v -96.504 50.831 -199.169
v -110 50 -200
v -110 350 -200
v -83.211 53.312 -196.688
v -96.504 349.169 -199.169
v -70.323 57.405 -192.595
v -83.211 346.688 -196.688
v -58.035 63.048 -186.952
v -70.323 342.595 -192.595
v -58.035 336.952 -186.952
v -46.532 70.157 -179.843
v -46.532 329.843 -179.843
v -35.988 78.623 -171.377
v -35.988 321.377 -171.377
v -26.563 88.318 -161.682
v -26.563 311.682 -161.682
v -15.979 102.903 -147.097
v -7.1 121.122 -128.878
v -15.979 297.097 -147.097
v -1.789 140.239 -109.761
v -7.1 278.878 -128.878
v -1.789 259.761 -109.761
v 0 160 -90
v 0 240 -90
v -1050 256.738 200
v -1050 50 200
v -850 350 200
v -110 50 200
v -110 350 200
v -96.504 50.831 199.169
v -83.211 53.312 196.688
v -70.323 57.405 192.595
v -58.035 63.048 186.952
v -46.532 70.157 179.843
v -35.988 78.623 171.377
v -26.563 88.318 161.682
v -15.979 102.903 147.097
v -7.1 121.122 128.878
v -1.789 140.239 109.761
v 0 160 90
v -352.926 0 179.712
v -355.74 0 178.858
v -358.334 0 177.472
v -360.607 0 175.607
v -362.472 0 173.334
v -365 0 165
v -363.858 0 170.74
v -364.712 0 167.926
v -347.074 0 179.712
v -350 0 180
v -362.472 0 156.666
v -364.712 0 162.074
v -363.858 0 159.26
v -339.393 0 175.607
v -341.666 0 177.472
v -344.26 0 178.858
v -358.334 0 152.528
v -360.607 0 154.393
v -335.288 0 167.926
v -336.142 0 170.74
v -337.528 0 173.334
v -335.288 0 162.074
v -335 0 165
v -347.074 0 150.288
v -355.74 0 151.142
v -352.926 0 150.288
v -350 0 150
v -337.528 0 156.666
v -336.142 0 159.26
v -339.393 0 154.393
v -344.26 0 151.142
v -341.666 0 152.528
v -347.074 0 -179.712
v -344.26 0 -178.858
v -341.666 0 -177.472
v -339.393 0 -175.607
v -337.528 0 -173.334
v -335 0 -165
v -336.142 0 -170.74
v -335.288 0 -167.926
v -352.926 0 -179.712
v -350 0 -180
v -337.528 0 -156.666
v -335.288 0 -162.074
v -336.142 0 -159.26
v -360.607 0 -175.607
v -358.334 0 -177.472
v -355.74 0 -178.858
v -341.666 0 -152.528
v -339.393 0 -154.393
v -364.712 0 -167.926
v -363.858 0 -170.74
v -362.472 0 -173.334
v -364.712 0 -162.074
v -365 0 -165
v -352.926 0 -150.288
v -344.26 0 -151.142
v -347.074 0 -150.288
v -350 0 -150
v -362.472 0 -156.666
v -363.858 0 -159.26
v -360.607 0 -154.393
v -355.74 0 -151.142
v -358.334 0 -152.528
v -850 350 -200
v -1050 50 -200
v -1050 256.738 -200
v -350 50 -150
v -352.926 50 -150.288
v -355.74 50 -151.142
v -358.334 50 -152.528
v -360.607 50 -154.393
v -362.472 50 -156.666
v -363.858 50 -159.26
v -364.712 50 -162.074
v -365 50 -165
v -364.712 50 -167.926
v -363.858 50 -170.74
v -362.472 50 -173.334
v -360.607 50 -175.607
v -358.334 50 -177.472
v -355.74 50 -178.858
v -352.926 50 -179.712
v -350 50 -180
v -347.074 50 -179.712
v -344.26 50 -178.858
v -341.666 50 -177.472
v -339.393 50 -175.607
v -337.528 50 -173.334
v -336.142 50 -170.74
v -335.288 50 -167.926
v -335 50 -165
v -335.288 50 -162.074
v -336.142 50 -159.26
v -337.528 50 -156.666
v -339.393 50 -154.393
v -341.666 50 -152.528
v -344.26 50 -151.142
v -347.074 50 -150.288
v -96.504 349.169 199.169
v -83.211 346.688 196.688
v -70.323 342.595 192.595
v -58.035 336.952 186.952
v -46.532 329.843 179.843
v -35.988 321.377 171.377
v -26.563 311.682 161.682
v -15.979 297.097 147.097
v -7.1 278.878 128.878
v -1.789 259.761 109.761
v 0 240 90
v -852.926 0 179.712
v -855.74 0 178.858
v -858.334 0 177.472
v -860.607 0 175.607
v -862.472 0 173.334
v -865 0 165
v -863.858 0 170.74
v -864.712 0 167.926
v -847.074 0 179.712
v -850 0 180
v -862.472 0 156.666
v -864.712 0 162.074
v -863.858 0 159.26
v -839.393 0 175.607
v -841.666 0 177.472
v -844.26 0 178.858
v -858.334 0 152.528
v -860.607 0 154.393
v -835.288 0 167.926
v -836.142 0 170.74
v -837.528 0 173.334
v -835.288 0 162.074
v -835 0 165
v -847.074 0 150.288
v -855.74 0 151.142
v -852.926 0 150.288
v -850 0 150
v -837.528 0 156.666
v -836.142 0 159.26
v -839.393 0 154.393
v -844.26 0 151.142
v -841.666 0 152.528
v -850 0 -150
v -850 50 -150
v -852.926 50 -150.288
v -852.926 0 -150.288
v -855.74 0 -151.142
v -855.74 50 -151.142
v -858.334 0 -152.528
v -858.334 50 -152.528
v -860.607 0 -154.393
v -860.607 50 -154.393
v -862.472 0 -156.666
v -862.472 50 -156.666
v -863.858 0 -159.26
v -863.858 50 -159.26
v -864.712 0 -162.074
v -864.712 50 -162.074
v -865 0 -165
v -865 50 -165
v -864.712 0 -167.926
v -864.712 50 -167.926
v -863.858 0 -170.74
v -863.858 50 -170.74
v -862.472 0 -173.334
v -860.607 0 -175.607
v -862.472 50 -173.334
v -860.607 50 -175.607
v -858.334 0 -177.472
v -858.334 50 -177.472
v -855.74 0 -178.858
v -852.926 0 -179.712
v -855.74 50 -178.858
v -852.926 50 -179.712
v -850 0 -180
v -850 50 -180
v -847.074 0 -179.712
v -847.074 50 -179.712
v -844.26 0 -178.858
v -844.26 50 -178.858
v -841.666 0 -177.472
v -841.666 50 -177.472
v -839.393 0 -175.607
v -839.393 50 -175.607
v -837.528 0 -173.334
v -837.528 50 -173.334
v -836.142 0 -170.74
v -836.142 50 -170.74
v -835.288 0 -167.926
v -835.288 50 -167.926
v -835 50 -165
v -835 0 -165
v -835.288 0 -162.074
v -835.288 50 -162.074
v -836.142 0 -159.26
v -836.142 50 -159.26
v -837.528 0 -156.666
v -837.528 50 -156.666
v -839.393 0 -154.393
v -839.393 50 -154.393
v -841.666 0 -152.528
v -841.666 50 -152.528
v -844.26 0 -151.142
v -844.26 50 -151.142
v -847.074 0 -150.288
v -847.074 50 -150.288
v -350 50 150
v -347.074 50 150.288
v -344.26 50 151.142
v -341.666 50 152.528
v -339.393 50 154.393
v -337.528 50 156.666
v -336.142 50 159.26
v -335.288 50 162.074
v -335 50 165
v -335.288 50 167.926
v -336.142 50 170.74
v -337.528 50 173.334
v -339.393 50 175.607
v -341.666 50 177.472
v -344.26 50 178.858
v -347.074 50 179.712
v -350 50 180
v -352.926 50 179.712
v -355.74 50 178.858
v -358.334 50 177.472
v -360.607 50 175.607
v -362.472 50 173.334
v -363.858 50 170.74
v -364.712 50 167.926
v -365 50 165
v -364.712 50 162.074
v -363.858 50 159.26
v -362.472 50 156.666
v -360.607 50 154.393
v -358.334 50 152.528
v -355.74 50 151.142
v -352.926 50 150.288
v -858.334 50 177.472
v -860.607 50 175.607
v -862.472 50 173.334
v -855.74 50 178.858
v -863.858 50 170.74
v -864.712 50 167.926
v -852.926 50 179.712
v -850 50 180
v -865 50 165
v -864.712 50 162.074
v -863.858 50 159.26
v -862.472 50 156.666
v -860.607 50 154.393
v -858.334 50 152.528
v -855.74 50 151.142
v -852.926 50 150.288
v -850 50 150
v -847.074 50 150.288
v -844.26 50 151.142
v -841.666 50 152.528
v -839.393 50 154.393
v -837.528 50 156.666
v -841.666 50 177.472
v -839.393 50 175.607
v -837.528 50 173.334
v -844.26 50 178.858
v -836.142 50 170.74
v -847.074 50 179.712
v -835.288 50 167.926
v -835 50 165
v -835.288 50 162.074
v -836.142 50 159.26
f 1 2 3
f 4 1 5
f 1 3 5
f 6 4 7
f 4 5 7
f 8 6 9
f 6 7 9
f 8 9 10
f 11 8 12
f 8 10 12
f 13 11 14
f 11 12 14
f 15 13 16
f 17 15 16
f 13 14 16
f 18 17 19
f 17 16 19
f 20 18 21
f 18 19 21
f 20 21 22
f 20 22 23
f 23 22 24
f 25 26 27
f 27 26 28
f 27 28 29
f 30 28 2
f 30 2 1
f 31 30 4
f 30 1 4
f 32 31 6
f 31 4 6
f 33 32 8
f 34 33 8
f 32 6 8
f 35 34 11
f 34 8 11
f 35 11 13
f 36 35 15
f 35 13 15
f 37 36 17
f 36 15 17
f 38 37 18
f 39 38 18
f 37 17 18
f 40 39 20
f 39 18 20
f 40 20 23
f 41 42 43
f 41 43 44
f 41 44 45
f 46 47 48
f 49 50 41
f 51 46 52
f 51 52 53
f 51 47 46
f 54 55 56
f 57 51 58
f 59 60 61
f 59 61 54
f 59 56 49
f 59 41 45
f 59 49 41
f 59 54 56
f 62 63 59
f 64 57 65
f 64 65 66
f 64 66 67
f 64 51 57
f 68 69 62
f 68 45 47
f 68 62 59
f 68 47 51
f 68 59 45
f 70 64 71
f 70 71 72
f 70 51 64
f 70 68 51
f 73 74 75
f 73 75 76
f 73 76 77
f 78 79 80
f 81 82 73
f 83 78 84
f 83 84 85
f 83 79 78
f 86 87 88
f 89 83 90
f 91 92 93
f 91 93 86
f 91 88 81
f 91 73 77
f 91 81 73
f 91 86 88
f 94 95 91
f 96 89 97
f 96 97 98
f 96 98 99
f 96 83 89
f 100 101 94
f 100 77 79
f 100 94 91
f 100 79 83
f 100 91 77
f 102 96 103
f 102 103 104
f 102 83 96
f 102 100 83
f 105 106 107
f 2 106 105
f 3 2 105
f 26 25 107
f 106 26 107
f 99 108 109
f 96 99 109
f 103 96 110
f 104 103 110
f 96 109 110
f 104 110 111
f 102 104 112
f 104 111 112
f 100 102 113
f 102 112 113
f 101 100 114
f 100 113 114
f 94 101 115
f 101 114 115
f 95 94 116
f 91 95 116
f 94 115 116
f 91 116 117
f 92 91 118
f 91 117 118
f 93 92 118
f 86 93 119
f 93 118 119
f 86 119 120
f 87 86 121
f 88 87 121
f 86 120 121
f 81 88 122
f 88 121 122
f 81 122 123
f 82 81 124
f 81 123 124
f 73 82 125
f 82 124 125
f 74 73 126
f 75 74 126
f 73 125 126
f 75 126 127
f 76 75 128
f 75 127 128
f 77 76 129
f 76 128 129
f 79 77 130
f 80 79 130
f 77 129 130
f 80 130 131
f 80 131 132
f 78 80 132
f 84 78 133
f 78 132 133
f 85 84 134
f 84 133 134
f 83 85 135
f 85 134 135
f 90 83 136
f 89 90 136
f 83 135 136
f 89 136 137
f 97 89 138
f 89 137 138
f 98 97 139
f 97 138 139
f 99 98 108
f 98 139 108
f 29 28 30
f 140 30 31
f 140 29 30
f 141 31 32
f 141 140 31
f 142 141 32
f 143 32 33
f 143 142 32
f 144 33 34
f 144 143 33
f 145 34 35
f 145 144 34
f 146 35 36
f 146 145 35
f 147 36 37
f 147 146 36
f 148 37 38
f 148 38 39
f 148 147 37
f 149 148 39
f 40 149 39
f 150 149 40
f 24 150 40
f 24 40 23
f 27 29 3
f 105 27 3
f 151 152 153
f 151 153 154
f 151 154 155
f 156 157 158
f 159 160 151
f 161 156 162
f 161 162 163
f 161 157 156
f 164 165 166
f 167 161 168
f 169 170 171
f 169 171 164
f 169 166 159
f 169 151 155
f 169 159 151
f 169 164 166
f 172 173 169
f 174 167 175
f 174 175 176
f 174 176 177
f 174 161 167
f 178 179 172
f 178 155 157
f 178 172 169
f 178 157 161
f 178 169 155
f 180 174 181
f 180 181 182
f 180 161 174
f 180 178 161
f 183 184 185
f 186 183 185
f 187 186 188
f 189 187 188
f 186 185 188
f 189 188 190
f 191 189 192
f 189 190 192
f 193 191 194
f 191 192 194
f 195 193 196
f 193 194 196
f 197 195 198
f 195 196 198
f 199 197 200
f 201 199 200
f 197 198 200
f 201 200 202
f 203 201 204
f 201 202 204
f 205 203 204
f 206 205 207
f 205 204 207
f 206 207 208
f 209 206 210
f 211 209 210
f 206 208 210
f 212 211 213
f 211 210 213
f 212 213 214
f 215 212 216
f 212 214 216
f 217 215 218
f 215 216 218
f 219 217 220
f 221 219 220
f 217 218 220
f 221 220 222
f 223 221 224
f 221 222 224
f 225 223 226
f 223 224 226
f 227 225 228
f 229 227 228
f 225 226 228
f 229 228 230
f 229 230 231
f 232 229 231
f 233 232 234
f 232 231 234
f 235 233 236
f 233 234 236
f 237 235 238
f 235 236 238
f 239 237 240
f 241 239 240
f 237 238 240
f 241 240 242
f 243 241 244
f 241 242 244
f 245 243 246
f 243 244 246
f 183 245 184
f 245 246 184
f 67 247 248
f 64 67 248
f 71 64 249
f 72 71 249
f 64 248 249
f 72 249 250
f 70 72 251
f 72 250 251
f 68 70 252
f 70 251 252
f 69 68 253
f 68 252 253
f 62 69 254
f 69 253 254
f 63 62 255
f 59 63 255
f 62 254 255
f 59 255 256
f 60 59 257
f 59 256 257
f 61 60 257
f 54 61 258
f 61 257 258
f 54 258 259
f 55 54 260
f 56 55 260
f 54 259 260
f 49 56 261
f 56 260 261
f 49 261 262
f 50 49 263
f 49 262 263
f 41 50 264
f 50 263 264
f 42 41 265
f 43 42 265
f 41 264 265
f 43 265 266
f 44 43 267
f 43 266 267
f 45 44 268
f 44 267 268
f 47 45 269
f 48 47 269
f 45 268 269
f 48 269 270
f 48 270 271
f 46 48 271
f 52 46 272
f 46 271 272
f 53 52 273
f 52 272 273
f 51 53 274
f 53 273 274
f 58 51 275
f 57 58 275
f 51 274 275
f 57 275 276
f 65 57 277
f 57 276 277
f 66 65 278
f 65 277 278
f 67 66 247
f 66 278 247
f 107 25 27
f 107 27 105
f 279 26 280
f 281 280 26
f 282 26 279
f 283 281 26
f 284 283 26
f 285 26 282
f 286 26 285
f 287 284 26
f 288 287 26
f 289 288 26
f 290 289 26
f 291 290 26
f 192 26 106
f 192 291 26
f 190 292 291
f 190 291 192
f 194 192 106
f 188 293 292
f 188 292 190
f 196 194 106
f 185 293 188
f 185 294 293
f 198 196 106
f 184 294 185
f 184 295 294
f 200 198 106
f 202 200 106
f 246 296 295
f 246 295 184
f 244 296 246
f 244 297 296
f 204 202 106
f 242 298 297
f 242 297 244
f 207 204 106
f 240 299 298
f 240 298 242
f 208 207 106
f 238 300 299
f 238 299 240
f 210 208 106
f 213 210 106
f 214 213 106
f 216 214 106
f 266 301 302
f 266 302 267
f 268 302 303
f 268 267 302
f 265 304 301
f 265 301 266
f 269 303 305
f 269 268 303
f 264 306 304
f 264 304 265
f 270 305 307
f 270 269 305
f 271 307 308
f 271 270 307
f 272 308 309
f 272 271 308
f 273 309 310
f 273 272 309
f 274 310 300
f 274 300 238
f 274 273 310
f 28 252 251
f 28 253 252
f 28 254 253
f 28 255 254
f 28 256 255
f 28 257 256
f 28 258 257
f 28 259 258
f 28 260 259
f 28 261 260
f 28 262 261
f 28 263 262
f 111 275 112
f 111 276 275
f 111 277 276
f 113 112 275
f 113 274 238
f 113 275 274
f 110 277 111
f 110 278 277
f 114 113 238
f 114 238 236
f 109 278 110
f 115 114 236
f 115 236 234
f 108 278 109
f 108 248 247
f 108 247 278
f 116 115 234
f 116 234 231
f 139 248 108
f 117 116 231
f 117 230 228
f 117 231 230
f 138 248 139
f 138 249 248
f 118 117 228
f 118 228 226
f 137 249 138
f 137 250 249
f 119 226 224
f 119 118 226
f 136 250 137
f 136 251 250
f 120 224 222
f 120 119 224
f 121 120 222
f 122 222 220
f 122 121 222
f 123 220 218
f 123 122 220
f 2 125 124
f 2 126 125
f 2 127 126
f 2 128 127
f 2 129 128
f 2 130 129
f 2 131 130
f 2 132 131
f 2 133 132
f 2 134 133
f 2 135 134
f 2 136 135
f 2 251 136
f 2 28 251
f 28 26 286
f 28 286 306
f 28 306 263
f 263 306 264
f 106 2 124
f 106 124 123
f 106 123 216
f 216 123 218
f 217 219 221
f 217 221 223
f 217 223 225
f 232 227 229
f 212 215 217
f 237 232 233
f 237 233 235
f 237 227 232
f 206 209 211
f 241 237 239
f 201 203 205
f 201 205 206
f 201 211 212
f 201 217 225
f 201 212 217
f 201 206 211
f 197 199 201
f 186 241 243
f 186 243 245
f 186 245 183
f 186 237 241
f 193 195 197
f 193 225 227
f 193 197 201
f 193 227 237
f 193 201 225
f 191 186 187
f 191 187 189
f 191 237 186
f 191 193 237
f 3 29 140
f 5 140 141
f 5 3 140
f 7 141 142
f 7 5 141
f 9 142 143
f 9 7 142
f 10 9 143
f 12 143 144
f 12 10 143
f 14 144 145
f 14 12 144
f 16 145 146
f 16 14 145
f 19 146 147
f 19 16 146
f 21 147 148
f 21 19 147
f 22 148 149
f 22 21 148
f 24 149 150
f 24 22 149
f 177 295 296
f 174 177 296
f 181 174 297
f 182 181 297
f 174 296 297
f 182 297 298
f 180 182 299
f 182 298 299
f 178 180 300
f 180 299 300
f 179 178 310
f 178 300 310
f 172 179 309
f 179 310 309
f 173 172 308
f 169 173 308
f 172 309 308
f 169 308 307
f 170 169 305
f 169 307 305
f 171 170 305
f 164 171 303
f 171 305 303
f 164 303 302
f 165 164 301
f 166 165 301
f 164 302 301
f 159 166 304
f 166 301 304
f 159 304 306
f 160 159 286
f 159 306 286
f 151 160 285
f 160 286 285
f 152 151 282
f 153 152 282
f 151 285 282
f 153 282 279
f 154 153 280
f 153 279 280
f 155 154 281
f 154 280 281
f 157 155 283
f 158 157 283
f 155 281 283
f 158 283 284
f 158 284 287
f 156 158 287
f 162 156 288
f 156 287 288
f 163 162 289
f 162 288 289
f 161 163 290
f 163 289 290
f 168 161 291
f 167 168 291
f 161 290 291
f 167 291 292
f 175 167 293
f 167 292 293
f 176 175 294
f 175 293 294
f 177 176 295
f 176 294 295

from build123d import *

# Parameters (mm, degrees)
SKETCH3_W           = 400
SKETCH3_H           = 300
BOSS_EXTRUDE2_DEPTH = 1050
FILLET1_R           = 110
CHAMFER1_SIZE       = 200
CHAMFER1_SIZE2      = 93.261531631
SKETCH4_R           = 15
BOSS_EXTRUDE3_DEPTH = 50


with BuildPart() as part:
    # Sketch3 → Boss-Extrude2 (new body)
    with BuildSketch(Plane(origin=(0, 0, 0), x_dir=(0, 0, -1), z_dir=(1, 0, 0))):
        with Locations((0, 200)):
            Rectangle(SKETCH3_W, SKETCH3_H)
    extrude(amount=-BOSS_EXTRUDE2_DEPTH)

    # Fillet1
    fillet1_edges = [part.edges().sort_by_distance(p)[0] for p in [
        (0, 350, 0),
        (0, 200, -200),
        (0, 50, 0),
        (0, 200, 200),
    ]]
    fillet(fillet1_edges, radius=FILLET1_R)

    # Chamfer1
    chamfer1_edges = [part.edges().sort_by_distance(p)[0] for p in [
        (-1050, 350, 0),
    ]]
    chamfer1_side = [part.faces().sort_by_distance(p)[0] for p in [
        (-580, 350, 0),
    ]]
    chamfer(chamfer1_edges, length=CHAMFER1_SIZE, length2=CHAMFER1_SIZE2, reference=chamfer1_side[0])

    # Sketch4 → Boss-Extrude3 (add)
    with BuildSketch(Plane.XZ.offset(-50)):
        with Locations(Location((-850, 165, 0), (0, 0, 270))):
            Circle(SKETCH4_R)
        with Locations(Location((-350, 165, 0), (0, 0, 270))):
            Circle(SKETCH4_R)
        with Locations(Location((-350, -165, 0), (0, 0, 90))):
            Circle(SKETCH4_R)
        with Locations(Location((-850, -165, 0), (0, 0, 90))):
            Circle(SKETCH4_R)
    extrude(amount=BOSS_EXTRUDE3_DEPTH)


solid = part.part
